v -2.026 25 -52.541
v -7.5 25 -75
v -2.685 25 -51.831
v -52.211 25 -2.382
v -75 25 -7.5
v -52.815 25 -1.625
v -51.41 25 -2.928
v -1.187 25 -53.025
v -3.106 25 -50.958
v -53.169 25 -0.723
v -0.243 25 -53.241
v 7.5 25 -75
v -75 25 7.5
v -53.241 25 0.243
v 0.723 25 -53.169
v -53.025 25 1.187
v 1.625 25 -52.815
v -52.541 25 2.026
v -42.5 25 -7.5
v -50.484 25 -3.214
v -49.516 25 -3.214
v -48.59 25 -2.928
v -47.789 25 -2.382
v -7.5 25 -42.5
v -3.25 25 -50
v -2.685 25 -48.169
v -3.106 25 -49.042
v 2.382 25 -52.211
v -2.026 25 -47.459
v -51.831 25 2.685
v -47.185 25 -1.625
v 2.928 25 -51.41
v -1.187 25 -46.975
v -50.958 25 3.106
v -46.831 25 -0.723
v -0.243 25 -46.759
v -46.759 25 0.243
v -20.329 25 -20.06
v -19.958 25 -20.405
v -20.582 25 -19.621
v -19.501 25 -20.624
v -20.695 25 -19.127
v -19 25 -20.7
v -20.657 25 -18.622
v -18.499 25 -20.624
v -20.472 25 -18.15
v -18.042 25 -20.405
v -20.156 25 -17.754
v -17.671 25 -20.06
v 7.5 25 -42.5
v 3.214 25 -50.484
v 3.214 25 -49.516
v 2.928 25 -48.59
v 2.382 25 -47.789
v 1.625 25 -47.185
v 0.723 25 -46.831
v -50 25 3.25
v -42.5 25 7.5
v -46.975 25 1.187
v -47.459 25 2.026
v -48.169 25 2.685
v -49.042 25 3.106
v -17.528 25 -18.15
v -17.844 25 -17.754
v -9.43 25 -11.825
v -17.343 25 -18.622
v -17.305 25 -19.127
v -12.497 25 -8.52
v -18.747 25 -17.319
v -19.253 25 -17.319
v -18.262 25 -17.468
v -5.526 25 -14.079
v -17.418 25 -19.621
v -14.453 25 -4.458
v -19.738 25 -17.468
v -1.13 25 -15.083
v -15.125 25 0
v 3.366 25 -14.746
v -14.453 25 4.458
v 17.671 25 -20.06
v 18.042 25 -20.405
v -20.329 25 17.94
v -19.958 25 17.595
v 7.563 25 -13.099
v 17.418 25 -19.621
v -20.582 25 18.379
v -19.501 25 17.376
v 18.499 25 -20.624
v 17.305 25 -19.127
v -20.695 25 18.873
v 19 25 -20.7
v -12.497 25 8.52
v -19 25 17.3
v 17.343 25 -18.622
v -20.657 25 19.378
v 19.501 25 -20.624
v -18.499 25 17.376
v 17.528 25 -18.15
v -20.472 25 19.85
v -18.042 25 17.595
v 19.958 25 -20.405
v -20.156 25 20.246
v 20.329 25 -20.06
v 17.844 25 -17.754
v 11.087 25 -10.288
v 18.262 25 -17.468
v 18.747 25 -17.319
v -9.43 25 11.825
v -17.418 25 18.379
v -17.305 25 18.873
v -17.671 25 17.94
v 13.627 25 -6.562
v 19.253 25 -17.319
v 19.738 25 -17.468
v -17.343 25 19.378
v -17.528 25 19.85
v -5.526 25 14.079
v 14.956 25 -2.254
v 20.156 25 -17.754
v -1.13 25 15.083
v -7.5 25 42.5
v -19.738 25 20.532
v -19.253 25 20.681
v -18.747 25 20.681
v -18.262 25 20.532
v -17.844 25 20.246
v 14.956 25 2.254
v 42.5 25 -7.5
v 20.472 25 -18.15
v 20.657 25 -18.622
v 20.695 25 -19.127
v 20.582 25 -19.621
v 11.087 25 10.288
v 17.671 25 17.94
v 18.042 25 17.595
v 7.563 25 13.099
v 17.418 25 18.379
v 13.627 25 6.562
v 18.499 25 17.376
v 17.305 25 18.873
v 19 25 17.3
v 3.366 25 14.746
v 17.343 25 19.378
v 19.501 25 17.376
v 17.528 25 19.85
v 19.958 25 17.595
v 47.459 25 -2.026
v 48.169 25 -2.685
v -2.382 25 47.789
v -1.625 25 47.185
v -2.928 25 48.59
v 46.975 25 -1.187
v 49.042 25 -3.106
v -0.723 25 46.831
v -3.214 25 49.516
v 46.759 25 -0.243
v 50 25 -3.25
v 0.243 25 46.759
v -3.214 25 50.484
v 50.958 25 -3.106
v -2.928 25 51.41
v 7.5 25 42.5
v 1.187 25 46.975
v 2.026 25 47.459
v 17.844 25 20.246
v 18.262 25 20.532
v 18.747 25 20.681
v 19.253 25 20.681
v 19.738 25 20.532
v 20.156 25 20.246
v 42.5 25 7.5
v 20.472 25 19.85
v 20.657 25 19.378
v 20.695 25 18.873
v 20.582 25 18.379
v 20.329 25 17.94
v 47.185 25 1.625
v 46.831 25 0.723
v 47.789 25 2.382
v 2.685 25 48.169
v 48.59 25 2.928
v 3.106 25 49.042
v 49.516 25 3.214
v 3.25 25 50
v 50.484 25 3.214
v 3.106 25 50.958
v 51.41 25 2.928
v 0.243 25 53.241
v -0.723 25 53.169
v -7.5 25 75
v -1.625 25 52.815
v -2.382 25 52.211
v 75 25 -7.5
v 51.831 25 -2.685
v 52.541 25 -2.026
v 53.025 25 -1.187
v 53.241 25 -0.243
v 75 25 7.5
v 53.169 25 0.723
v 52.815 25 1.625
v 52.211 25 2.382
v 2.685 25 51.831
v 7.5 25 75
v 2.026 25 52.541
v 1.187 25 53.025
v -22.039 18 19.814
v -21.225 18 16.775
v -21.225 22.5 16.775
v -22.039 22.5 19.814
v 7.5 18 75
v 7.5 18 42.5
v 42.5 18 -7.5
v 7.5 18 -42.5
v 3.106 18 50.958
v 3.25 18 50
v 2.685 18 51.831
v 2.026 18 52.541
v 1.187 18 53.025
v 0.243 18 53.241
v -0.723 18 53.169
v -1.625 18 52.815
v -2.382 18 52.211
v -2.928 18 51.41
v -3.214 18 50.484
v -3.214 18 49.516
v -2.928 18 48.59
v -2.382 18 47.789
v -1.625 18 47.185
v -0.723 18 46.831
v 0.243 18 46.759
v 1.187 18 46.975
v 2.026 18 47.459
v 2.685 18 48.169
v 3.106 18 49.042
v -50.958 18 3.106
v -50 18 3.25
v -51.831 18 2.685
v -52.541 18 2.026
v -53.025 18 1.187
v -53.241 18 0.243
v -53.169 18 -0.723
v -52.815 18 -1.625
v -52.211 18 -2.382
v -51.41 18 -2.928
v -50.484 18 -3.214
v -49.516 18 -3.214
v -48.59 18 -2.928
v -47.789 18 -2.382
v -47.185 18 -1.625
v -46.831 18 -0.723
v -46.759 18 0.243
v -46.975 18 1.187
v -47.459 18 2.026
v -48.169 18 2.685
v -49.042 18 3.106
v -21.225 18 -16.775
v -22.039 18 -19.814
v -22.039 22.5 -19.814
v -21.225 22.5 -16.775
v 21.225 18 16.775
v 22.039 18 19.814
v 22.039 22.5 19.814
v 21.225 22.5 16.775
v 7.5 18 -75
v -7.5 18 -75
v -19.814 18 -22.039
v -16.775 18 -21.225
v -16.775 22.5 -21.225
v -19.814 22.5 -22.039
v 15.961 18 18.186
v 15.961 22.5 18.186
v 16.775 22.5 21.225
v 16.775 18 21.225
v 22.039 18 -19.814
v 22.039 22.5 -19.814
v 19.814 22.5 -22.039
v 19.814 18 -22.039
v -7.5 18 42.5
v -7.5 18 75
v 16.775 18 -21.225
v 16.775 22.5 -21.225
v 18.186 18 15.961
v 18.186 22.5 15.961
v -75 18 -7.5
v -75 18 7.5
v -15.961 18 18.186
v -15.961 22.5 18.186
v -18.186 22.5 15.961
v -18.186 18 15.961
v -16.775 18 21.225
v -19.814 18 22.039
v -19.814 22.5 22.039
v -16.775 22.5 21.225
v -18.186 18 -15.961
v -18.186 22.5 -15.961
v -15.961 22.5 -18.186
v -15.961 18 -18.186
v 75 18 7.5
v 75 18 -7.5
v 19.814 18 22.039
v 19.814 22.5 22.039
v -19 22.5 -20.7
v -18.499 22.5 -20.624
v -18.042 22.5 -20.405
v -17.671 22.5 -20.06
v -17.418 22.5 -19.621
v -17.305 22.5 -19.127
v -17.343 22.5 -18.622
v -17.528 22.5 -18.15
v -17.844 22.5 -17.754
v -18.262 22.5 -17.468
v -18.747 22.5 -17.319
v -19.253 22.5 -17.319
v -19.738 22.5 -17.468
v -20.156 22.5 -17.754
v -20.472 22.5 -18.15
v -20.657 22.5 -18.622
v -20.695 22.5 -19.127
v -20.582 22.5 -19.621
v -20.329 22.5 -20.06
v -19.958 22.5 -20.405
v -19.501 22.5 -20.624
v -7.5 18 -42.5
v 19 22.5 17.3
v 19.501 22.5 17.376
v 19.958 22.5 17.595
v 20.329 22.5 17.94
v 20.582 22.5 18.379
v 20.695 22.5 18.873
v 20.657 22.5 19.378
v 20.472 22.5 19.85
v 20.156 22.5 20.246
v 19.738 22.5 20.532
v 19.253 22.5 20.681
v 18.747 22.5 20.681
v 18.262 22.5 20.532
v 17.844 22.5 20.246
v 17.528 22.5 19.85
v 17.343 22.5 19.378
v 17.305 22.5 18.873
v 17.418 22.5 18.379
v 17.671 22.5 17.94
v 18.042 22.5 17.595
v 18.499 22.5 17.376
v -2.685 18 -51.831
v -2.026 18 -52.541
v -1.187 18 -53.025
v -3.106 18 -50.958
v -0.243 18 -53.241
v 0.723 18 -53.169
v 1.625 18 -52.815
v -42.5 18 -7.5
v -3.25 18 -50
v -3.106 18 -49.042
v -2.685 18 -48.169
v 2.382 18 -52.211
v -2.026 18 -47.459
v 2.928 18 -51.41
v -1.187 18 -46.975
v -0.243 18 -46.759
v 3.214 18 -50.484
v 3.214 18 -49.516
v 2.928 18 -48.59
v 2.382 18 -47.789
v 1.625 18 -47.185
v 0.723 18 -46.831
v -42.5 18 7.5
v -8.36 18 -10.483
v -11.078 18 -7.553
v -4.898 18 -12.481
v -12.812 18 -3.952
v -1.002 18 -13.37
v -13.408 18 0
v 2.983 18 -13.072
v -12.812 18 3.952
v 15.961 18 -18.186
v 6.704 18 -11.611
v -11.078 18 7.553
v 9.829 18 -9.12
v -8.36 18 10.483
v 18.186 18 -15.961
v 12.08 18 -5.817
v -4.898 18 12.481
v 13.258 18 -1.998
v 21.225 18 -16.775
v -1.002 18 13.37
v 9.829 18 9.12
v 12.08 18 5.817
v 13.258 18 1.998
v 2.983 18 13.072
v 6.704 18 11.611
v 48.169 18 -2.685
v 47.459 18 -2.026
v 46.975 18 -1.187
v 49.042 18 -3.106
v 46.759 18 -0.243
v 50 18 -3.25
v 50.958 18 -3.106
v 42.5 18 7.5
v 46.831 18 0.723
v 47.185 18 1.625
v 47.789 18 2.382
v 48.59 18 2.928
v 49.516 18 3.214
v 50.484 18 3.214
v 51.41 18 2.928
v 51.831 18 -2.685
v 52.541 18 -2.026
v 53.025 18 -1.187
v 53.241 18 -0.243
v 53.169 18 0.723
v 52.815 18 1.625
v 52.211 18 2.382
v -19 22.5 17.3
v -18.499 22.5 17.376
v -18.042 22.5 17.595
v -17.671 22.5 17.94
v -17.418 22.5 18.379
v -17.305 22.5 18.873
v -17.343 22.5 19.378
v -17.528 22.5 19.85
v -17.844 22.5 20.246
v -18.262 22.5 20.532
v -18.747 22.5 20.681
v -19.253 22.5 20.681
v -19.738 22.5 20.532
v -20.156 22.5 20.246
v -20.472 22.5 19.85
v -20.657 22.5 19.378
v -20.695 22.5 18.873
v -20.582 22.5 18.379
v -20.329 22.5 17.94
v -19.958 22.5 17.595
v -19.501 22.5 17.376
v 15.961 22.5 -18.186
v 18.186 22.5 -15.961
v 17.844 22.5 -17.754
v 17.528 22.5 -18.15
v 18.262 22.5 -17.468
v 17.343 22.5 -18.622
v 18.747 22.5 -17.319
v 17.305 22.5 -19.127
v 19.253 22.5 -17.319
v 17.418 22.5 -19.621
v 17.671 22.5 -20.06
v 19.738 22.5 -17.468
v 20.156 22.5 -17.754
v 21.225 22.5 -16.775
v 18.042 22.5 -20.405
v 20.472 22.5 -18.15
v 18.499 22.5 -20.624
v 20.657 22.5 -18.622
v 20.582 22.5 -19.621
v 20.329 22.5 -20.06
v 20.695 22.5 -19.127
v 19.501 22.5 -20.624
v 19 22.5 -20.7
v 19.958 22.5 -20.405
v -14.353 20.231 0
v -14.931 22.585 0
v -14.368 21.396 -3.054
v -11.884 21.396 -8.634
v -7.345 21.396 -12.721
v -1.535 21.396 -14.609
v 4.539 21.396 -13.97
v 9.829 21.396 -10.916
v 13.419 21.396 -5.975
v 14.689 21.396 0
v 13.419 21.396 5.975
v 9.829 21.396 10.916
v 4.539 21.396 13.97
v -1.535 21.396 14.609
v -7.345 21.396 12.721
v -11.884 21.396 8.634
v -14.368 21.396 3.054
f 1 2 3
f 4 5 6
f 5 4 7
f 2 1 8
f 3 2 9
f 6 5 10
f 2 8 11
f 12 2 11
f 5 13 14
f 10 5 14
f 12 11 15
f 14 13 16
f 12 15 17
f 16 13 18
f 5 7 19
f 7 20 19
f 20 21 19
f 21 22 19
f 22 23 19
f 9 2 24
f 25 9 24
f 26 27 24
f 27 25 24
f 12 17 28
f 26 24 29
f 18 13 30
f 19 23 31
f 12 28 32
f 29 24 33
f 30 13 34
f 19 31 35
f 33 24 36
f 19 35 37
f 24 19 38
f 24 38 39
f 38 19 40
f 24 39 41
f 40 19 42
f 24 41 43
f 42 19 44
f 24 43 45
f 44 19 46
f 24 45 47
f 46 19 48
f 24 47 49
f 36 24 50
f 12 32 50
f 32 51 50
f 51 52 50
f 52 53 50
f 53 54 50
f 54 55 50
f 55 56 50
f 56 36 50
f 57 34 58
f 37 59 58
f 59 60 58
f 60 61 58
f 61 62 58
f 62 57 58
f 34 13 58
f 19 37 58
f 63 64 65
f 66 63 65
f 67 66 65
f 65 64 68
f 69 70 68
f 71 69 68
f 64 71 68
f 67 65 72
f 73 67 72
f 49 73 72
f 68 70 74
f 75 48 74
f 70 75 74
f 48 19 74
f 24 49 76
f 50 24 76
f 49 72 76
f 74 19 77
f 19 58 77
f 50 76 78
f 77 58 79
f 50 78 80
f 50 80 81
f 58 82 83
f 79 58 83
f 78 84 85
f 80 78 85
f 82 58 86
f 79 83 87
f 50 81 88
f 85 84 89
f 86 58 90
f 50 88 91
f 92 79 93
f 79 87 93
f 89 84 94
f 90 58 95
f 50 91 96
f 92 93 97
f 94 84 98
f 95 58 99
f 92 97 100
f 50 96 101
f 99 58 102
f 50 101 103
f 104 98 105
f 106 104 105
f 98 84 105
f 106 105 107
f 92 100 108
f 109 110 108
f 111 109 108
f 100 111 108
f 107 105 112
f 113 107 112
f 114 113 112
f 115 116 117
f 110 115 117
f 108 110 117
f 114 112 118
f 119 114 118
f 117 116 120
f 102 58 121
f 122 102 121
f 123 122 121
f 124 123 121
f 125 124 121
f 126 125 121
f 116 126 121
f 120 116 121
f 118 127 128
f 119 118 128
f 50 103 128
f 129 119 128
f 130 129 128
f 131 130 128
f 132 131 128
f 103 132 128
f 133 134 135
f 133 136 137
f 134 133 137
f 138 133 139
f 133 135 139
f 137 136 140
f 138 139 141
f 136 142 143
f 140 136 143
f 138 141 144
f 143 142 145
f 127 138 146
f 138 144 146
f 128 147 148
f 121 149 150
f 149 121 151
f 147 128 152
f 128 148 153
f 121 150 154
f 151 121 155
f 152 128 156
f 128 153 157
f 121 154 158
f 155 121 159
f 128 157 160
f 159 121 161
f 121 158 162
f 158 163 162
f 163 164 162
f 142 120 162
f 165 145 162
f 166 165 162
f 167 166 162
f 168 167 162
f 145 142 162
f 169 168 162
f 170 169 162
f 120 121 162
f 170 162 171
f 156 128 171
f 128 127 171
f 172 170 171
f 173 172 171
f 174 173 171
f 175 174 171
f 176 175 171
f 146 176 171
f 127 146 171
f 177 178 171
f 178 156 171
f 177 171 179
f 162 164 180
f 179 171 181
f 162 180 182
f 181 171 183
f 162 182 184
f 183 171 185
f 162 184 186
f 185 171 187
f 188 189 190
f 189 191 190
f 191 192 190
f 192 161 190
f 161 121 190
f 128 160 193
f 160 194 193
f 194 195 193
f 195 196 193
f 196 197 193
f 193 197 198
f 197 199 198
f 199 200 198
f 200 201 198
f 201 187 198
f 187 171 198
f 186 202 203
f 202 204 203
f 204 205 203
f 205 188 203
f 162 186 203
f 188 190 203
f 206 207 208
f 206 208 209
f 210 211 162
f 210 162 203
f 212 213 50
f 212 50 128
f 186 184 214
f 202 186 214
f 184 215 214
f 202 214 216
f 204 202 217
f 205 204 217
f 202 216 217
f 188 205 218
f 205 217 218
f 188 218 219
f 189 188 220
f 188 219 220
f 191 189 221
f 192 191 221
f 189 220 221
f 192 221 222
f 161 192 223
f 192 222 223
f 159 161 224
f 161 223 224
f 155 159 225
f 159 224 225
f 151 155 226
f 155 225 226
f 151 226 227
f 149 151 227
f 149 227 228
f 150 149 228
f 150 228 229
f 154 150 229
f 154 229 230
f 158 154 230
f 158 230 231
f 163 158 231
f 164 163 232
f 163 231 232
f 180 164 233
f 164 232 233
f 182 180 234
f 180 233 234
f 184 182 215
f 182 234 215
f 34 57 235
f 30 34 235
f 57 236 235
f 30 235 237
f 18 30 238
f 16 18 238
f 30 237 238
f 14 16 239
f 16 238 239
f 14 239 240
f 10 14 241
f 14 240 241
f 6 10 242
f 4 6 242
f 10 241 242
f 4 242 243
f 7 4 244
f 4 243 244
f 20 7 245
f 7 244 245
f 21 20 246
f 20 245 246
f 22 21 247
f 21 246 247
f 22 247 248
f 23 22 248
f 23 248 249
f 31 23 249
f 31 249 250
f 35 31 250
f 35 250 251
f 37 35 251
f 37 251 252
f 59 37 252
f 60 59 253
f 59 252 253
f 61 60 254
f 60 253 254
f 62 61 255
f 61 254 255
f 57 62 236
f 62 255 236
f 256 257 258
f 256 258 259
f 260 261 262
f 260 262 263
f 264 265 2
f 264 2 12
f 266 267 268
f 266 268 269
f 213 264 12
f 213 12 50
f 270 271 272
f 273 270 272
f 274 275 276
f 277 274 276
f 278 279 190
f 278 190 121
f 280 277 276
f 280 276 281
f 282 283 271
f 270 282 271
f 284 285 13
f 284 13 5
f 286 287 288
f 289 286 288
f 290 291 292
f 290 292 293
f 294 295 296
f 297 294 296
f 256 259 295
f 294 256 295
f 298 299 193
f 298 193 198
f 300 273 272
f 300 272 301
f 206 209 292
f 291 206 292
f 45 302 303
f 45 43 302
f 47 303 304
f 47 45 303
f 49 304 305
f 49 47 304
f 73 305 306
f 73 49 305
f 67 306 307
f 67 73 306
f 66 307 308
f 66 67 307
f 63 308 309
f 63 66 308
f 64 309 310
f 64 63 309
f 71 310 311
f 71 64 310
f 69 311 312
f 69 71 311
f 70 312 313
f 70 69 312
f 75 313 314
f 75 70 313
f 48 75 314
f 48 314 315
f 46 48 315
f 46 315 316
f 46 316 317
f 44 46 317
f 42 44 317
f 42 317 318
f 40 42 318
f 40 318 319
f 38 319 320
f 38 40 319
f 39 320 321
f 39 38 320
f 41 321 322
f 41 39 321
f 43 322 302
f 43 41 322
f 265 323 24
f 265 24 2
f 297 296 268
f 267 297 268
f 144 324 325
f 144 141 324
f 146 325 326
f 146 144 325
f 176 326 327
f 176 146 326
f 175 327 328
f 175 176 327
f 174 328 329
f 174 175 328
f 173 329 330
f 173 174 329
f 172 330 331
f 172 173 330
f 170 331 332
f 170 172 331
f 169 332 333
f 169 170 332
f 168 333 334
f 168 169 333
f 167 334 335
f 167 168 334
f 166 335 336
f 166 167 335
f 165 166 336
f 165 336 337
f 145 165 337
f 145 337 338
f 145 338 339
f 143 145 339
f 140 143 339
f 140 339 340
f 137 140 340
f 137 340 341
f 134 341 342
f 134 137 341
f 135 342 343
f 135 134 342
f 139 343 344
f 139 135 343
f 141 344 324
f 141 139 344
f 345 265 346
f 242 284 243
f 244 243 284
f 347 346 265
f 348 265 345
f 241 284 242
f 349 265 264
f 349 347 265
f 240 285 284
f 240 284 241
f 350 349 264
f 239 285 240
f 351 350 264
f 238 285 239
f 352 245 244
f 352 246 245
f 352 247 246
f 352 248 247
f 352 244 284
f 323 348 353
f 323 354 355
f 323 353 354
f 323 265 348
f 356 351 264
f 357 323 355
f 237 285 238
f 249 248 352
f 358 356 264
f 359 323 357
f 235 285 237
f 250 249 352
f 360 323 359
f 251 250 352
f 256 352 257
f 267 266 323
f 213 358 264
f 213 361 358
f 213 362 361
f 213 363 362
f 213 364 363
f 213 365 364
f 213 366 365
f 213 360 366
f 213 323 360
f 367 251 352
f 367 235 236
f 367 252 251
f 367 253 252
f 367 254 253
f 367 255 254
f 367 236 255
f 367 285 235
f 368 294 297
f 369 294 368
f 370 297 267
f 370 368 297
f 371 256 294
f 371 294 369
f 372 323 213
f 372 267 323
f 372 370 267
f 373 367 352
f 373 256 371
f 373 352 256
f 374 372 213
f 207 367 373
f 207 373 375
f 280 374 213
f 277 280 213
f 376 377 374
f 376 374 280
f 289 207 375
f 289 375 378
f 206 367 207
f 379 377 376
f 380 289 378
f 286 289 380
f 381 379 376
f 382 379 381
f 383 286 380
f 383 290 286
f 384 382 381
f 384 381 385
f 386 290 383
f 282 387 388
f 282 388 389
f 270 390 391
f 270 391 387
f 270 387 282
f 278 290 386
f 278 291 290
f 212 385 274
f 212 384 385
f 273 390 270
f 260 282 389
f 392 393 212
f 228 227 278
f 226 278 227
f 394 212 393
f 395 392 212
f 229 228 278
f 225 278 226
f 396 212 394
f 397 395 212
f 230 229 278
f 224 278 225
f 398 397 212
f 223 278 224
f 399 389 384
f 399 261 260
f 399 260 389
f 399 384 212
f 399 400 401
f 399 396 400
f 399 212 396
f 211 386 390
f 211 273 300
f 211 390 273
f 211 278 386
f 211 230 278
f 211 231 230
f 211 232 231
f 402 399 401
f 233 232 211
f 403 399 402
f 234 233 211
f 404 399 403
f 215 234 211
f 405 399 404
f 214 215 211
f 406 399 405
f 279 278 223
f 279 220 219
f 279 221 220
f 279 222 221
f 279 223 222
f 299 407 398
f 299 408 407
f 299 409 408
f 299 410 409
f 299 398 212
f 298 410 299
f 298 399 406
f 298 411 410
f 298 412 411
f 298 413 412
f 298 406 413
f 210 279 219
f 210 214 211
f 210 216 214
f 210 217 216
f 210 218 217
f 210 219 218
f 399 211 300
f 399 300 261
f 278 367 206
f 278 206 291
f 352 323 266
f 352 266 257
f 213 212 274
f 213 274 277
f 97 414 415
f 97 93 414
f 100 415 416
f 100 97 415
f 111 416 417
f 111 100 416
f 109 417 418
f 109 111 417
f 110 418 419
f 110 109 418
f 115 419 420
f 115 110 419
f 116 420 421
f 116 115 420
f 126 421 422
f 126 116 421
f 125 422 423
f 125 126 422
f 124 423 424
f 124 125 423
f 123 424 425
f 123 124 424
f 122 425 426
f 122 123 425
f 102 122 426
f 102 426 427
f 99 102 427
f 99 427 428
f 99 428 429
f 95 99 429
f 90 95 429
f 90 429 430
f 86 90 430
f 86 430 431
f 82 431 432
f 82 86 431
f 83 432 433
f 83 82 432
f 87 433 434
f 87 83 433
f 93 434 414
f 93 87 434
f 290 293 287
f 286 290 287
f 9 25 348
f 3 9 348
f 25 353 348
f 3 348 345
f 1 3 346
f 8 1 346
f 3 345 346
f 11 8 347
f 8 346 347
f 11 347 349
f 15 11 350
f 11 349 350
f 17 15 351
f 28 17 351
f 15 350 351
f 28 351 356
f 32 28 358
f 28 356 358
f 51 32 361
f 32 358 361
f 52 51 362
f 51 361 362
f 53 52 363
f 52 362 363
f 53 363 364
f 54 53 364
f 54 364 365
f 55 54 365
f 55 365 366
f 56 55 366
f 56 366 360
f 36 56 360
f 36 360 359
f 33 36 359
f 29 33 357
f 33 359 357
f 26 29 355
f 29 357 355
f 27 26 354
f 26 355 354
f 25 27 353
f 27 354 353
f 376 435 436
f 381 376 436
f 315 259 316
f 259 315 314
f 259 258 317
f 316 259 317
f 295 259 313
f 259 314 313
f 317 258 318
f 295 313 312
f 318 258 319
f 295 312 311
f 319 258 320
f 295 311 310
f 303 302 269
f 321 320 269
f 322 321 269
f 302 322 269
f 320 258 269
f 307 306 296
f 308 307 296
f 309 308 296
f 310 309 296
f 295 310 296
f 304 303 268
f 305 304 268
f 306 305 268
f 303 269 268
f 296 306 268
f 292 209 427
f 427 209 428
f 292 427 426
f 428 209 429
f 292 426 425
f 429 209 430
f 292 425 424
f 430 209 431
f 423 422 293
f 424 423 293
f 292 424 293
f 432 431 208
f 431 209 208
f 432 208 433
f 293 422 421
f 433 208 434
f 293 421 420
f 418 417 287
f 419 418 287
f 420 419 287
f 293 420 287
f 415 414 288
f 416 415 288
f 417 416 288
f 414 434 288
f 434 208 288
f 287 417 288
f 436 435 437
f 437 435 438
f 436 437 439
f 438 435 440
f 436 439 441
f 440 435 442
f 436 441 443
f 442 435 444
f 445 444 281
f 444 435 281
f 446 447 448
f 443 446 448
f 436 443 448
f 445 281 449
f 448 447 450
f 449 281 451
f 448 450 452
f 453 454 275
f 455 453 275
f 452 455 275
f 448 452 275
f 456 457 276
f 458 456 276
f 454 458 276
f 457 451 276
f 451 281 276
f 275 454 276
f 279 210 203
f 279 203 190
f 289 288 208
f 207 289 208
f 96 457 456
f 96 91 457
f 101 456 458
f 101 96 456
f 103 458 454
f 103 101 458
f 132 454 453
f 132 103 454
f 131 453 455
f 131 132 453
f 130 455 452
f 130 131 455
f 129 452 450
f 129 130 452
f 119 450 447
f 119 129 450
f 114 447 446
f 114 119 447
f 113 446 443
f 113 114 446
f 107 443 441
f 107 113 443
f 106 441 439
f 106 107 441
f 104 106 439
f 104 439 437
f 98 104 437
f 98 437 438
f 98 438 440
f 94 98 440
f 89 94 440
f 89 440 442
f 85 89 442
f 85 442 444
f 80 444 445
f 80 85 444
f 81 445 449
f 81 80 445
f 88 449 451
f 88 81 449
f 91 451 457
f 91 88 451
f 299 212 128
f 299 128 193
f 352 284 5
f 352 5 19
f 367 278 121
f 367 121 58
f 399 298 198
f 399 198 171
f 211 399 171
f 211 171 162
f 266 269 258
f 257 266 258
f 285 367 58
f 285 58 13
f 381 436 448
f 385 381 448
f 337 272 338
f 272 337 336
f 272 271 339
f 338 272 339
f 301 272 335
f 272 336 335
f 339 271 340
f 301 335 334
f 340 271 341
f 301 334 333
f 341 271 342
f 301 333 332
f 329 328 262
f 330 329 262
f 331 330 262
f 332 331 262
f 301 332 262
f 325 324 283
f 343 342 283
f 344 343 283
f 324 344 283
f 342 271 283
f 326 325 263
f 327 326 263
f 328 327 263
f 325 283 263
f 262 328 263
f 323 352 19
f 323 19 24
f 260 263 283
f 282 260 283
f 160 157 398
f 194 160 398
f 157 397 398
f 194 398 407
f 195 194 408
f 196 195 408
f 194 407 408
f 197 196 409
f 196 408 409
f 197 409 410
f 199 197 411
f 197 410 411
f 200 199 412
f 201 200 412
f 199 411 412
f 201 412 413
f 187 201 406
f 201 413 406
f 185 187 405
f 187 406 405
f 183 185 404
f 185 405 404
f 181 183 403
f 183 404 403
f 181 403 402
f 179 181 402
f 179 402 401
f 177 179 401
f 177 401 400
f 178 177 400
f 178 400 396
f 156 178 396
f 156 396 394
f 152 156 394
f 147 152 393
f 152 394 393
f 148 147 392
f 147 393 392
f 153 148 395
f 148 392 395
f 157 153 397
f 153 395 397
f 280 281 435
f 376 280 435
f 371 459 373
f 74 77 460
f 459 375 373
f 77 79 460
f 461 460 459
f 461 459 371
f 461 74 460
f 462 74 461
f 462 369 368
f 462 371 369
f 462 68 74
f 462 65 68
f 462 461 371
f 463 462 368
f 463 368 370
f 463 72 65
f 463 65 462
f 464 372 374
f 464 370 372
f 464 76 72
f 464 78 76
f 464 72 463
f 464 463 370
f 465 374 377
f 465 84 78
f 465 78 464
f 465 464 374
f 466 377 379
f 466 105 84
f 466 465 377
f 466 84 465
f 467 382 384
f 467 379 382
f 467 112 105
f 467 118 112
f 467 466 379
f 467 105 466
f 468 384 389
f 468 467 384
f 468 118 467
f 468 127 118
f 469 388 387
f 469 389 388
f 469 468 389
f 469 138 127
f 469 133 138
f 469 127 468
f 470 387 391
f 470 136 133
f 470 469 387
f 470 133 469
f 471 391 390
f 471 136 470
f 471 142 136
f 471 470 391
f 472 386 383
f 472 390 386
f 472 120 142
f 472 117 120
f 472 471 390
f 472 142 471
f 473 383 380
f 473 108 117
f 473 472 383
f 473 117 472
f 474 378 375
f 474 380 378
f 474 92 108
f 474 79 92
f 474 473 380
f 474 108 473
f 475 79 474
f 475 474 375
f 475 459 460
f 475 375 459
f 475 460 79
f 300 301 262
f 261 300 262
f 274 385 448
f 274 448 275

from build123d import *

# Parameters (mm, degrees)
SKETCH1_W               = 50
SKETCH1_H               = 50
BOSS_EXTRUDE1_DEPTH     = 25
CUT_EXTRUDE1_DEPTH      = 44.301270189
CUT_EXTRUDE1_DEPTH_BACK = 44.301270189
SKETCH3_R               = 5.1
CUT_EXTRUDE2_DEPTH      = 62.23724357
CUT_EXTRUDE2_DEPTH_BACK = 62.23724357
SKETCH4_W               = 50
SKETCH4_H               = 18
CUT_EXTRUDE3_START      = -2.5
SKETCH5_R               = 1.7
CUT_EXTRUDE3_DEPTH      = 34.541642582
CUT_EXTRUDE5_DEPTH      = 37.041642582
CUT_EXTRUDE5_DEPTH_BACK = 37.041642582
SKETCH6_R               = 1.7
BOSS_EXTRUDE5_DEPTH     = 7
SKETCH8_R               = 3.25
CUT_EXTRUDE6_DEPTH      = 107.296754419
CIRPATTERN1_COUNT       = 4


with BuildPart() as part:
    # Sketch1 → Boss-Extrude1 (new body)
    with BuildSketch(Plane(origin=(0, 0, 0), x_dir=(1, 0, 0), z_dir=(0, 1, 0))):
        Rectangle(SKETCH1_W, SKETCH1_H)
    extrude(amount=BOSS_EXTRUDE1_DEPTH)

    # Sketch2 → Cut-Revolve1 (revolve, cut)
    with BuildSketch(Plane.XY):
        with BuildLine():
            Line((-15.125, 25), (0, 25))
            Line((0, 25), (0, 9.875))
            ThreePointArc((0, 9.875), (-10.694990065, 14.305009935), (-15.125, 25))
        make_face()
    revolve(axis=Axis((0, 25, 0), (0, -1, 0)), mode=Mode.SUBTRACT)

    # Sketch3 → Cut-Extrude1 (cut, two sides: drawn at the far end of the back side and taken through both)
    with BuildSketch(Plane.XZ.offset(-CUT_EXTRUDE1_DEPTH_BACK)):
        with Locations(Location((0, 0, 0), (0, 0, 90))):
            Circle(SKETCH3_R)
    extrude(amount=CUT_EXTRUDE1_DEPTH + CUT_EXTRUDE1_DEPTH_BACK, mode=Mode.SUBTRACT)

    # Sketch4 → Cut-Extrude2 (cut, two sides: drawn at the far end of the back side and taken through both)
    with BuildSketch(Plane.ZY.offset(25).offset(-CUT_EXTRUDE2_DEPTH_BACK)):
        with Locations((0, 9)):
            Rectangle(SKETCH4_W, SKETCH4_H)
    extrude(amount=CUT_EXTRUDE2_DEPTH + CUT_EXTRUDE2_DEPTH_BACK, mode=Mode.SUBTRACT)

    # Sketch5 → Cut-Extrude3 (cut, through all)
    # profile 1 of 4: a face of its own
    with BuildSketch(Plane(origin=(0, 25, 0), x_dir=(1, 0, 0), z_dir=(0, 1, 0)).offset(CUT_EXTRUDE3_START)):
        Polygon((22.03934257, 19.814389387), (19.814389387, 22.03934257), (16.775046817, 21.224953183), (15.96065743, 18.185610613), (18.185610613, 15.96065743), (21.224953183, 16.775046817), align=None)
        with Locations(Location((19, 19, 0), (0, 0, 270))):
            Circle(SKETCH5_R, mode=Mode.SUBTRACT)
    # profile 2 of 4: a face of its own
    with BuildSketch(Plane(origin=(0, 25, 0), x_dir=(1, 0, 0), z_dir=(0, 1, 0)).offset(CUT_EXTRUDE3_START)):
        Polygon((-16.775046817, 21.224953183), (-19.814389387, 22.03934257), (-22.03934257, 19.814389387), (-21.224953183, 16.775046817), (-18.185610613, 15.96065743), (-15.96065743, 18.185610613), align=None)
        with Locations(Location((-19, 19, 0), (0, 0, 270))):
            Circle(SKETCH5_R, mode=Mode.SUBTRACT)
    # profile 3 of 4: a face of its own
    with BuildSketch(Plane(origin=(0, 25, 0), x_dir=(1, 0, 0), z_dir=(0, 1, 0)).offset(CUT_EXTRUDE3_START)):
        Polygon((19.814389387, -22.03934257), (22.03934257, -19.814389387), (21.224953183, -16.775046817), (18.185610613, -15.96065743), (15.96065743, -18.185610613), (16.775046817, -21.224953183), align=None)
        with Locations(Location((19, -19, 0), (0, 0, 270))):
            Circle(SKETCH5_R, mode=Mode.SUBTRACT)
    # profile 4 of 4: a face of its own
    with BuildSketch(Plane(origin=(0, 25, 0), x_dir=(1, 0, 0), z_dir=(0, 1, 0)).offset(CUT_EXTRUDE3_START)):
        Polygon((-22.03934257, -19.814389387), (-19.814389387, -22.03934257), (-16.775046817, -21.224953183), (-15.96065743, -18.185610613), (-18.185610613, -15.96065743), (-21.224953183, -16.775046817), align=None)
        with Locations(Location((-19, -19, 0), (0, 0, 270))):
            Circle(SKETCH5_R, mode=Mode.SUBTRACT)
    extrude(amount=-CUT_EXTRUDE3_DEPTH, mode=Mode.SUBTRACT)

    # Sketch6 → Cut-Extrude5 (cut, two sides: drawn at the far end of the back side and taken through both)
    with BuildSketch(Plane.XZ.offset(-18).offset(-CUT_EXTRUDE5_DEPTH_BACK)):
        with Locations(Location((-19, -19, 0), (0, 0, 270))):
            Circle(SKETCH6_R)
        with Locations(Location((19, -19, 0), (0, 0, 270))):
            Circle(SKETCH6_R)
        with Locations(Location((19, 19, 0), (0, 0, 270))):
            Circle(SKETCH6_R)
        with Locations(Location((-19, 19, 0), (0, 0, 270))):
            Circle(SKETCH6_R)
    extrude(amount=CUT_EXTRUDE5_DEPTH + CUT_EXTRUDE5_DEPTH_BACK, mode=Mode.SUBTRACT)

    # Sketch7 → Boss-Extrude5 (add)
    with BuildSketch(Plane.XZ.offset(-18)):
        Polygon((42.5, 7.5), (25, 25), (25, -25), (42.5, -7.5), (75, -7.5), (75, 7.5), align=None)
        Polygon((-25, 25), (25, 25), (7.5, 42.5), (7.5, 75), (-7.5, 75), (-7.5, 42.5), align=None)
        Polygon((7.5, -42.5), (25, -25), (-25, -25), (-7.5, -42.5), (-7.5, -75), (7.5, -75), align=None)
        Polygon((-25, -25), (-25, 25), (-42.5, 7.5), (-75, 7.5), (-75, -7.5), (-42.5, -7.5), align=None)
    extrude(amount=-BOSS_EXTRUDE5_DEPTH)

    # Sketch8 → Cut-Extrude6 (cut, symmetric)
    with BuildSketch(Plane.XZ.offset(-18)):
        with Locations(Location((50, 0, 0), (0, 0, 270))):
            Circle(SKETCH8_R)
    cut_extrude6 = extrude(amount=CUT_EXTRUDE6_DEPTH, both=True, mode=Mode.SUBTRACT)

    # CirPattern1: Cut-Extrude6 ×4 about axis
    cirpattern1_axis = Axis((0, 0, 0), (0, 1, 0))
    for i in range(1, CIRPATTERN1_COUNT):
        add(cut_extrude6.rotate(cirpattern1_axis, i * 360 / CIRPATTERN1_COUNT), mode=Mode.SUBTRACT)

    # Sketch2<2> → Cut-Revolve2 (revolve, cut)
    with BuildSketch(Plane.XY):
        with BuildLine():
            Line((-15.125, 25), (0, 25))
            Line((0, 25), (0, 9.875))
            ThreePointArc((0, 9.875), (-10.694990065, 14.305009935), (-15.125, 25))
        make_face()
    revolve(axis=Axis((0, 25, 0), (0, -1, 0)), mode=Mode.SUBTRACT)


solid = part.part
